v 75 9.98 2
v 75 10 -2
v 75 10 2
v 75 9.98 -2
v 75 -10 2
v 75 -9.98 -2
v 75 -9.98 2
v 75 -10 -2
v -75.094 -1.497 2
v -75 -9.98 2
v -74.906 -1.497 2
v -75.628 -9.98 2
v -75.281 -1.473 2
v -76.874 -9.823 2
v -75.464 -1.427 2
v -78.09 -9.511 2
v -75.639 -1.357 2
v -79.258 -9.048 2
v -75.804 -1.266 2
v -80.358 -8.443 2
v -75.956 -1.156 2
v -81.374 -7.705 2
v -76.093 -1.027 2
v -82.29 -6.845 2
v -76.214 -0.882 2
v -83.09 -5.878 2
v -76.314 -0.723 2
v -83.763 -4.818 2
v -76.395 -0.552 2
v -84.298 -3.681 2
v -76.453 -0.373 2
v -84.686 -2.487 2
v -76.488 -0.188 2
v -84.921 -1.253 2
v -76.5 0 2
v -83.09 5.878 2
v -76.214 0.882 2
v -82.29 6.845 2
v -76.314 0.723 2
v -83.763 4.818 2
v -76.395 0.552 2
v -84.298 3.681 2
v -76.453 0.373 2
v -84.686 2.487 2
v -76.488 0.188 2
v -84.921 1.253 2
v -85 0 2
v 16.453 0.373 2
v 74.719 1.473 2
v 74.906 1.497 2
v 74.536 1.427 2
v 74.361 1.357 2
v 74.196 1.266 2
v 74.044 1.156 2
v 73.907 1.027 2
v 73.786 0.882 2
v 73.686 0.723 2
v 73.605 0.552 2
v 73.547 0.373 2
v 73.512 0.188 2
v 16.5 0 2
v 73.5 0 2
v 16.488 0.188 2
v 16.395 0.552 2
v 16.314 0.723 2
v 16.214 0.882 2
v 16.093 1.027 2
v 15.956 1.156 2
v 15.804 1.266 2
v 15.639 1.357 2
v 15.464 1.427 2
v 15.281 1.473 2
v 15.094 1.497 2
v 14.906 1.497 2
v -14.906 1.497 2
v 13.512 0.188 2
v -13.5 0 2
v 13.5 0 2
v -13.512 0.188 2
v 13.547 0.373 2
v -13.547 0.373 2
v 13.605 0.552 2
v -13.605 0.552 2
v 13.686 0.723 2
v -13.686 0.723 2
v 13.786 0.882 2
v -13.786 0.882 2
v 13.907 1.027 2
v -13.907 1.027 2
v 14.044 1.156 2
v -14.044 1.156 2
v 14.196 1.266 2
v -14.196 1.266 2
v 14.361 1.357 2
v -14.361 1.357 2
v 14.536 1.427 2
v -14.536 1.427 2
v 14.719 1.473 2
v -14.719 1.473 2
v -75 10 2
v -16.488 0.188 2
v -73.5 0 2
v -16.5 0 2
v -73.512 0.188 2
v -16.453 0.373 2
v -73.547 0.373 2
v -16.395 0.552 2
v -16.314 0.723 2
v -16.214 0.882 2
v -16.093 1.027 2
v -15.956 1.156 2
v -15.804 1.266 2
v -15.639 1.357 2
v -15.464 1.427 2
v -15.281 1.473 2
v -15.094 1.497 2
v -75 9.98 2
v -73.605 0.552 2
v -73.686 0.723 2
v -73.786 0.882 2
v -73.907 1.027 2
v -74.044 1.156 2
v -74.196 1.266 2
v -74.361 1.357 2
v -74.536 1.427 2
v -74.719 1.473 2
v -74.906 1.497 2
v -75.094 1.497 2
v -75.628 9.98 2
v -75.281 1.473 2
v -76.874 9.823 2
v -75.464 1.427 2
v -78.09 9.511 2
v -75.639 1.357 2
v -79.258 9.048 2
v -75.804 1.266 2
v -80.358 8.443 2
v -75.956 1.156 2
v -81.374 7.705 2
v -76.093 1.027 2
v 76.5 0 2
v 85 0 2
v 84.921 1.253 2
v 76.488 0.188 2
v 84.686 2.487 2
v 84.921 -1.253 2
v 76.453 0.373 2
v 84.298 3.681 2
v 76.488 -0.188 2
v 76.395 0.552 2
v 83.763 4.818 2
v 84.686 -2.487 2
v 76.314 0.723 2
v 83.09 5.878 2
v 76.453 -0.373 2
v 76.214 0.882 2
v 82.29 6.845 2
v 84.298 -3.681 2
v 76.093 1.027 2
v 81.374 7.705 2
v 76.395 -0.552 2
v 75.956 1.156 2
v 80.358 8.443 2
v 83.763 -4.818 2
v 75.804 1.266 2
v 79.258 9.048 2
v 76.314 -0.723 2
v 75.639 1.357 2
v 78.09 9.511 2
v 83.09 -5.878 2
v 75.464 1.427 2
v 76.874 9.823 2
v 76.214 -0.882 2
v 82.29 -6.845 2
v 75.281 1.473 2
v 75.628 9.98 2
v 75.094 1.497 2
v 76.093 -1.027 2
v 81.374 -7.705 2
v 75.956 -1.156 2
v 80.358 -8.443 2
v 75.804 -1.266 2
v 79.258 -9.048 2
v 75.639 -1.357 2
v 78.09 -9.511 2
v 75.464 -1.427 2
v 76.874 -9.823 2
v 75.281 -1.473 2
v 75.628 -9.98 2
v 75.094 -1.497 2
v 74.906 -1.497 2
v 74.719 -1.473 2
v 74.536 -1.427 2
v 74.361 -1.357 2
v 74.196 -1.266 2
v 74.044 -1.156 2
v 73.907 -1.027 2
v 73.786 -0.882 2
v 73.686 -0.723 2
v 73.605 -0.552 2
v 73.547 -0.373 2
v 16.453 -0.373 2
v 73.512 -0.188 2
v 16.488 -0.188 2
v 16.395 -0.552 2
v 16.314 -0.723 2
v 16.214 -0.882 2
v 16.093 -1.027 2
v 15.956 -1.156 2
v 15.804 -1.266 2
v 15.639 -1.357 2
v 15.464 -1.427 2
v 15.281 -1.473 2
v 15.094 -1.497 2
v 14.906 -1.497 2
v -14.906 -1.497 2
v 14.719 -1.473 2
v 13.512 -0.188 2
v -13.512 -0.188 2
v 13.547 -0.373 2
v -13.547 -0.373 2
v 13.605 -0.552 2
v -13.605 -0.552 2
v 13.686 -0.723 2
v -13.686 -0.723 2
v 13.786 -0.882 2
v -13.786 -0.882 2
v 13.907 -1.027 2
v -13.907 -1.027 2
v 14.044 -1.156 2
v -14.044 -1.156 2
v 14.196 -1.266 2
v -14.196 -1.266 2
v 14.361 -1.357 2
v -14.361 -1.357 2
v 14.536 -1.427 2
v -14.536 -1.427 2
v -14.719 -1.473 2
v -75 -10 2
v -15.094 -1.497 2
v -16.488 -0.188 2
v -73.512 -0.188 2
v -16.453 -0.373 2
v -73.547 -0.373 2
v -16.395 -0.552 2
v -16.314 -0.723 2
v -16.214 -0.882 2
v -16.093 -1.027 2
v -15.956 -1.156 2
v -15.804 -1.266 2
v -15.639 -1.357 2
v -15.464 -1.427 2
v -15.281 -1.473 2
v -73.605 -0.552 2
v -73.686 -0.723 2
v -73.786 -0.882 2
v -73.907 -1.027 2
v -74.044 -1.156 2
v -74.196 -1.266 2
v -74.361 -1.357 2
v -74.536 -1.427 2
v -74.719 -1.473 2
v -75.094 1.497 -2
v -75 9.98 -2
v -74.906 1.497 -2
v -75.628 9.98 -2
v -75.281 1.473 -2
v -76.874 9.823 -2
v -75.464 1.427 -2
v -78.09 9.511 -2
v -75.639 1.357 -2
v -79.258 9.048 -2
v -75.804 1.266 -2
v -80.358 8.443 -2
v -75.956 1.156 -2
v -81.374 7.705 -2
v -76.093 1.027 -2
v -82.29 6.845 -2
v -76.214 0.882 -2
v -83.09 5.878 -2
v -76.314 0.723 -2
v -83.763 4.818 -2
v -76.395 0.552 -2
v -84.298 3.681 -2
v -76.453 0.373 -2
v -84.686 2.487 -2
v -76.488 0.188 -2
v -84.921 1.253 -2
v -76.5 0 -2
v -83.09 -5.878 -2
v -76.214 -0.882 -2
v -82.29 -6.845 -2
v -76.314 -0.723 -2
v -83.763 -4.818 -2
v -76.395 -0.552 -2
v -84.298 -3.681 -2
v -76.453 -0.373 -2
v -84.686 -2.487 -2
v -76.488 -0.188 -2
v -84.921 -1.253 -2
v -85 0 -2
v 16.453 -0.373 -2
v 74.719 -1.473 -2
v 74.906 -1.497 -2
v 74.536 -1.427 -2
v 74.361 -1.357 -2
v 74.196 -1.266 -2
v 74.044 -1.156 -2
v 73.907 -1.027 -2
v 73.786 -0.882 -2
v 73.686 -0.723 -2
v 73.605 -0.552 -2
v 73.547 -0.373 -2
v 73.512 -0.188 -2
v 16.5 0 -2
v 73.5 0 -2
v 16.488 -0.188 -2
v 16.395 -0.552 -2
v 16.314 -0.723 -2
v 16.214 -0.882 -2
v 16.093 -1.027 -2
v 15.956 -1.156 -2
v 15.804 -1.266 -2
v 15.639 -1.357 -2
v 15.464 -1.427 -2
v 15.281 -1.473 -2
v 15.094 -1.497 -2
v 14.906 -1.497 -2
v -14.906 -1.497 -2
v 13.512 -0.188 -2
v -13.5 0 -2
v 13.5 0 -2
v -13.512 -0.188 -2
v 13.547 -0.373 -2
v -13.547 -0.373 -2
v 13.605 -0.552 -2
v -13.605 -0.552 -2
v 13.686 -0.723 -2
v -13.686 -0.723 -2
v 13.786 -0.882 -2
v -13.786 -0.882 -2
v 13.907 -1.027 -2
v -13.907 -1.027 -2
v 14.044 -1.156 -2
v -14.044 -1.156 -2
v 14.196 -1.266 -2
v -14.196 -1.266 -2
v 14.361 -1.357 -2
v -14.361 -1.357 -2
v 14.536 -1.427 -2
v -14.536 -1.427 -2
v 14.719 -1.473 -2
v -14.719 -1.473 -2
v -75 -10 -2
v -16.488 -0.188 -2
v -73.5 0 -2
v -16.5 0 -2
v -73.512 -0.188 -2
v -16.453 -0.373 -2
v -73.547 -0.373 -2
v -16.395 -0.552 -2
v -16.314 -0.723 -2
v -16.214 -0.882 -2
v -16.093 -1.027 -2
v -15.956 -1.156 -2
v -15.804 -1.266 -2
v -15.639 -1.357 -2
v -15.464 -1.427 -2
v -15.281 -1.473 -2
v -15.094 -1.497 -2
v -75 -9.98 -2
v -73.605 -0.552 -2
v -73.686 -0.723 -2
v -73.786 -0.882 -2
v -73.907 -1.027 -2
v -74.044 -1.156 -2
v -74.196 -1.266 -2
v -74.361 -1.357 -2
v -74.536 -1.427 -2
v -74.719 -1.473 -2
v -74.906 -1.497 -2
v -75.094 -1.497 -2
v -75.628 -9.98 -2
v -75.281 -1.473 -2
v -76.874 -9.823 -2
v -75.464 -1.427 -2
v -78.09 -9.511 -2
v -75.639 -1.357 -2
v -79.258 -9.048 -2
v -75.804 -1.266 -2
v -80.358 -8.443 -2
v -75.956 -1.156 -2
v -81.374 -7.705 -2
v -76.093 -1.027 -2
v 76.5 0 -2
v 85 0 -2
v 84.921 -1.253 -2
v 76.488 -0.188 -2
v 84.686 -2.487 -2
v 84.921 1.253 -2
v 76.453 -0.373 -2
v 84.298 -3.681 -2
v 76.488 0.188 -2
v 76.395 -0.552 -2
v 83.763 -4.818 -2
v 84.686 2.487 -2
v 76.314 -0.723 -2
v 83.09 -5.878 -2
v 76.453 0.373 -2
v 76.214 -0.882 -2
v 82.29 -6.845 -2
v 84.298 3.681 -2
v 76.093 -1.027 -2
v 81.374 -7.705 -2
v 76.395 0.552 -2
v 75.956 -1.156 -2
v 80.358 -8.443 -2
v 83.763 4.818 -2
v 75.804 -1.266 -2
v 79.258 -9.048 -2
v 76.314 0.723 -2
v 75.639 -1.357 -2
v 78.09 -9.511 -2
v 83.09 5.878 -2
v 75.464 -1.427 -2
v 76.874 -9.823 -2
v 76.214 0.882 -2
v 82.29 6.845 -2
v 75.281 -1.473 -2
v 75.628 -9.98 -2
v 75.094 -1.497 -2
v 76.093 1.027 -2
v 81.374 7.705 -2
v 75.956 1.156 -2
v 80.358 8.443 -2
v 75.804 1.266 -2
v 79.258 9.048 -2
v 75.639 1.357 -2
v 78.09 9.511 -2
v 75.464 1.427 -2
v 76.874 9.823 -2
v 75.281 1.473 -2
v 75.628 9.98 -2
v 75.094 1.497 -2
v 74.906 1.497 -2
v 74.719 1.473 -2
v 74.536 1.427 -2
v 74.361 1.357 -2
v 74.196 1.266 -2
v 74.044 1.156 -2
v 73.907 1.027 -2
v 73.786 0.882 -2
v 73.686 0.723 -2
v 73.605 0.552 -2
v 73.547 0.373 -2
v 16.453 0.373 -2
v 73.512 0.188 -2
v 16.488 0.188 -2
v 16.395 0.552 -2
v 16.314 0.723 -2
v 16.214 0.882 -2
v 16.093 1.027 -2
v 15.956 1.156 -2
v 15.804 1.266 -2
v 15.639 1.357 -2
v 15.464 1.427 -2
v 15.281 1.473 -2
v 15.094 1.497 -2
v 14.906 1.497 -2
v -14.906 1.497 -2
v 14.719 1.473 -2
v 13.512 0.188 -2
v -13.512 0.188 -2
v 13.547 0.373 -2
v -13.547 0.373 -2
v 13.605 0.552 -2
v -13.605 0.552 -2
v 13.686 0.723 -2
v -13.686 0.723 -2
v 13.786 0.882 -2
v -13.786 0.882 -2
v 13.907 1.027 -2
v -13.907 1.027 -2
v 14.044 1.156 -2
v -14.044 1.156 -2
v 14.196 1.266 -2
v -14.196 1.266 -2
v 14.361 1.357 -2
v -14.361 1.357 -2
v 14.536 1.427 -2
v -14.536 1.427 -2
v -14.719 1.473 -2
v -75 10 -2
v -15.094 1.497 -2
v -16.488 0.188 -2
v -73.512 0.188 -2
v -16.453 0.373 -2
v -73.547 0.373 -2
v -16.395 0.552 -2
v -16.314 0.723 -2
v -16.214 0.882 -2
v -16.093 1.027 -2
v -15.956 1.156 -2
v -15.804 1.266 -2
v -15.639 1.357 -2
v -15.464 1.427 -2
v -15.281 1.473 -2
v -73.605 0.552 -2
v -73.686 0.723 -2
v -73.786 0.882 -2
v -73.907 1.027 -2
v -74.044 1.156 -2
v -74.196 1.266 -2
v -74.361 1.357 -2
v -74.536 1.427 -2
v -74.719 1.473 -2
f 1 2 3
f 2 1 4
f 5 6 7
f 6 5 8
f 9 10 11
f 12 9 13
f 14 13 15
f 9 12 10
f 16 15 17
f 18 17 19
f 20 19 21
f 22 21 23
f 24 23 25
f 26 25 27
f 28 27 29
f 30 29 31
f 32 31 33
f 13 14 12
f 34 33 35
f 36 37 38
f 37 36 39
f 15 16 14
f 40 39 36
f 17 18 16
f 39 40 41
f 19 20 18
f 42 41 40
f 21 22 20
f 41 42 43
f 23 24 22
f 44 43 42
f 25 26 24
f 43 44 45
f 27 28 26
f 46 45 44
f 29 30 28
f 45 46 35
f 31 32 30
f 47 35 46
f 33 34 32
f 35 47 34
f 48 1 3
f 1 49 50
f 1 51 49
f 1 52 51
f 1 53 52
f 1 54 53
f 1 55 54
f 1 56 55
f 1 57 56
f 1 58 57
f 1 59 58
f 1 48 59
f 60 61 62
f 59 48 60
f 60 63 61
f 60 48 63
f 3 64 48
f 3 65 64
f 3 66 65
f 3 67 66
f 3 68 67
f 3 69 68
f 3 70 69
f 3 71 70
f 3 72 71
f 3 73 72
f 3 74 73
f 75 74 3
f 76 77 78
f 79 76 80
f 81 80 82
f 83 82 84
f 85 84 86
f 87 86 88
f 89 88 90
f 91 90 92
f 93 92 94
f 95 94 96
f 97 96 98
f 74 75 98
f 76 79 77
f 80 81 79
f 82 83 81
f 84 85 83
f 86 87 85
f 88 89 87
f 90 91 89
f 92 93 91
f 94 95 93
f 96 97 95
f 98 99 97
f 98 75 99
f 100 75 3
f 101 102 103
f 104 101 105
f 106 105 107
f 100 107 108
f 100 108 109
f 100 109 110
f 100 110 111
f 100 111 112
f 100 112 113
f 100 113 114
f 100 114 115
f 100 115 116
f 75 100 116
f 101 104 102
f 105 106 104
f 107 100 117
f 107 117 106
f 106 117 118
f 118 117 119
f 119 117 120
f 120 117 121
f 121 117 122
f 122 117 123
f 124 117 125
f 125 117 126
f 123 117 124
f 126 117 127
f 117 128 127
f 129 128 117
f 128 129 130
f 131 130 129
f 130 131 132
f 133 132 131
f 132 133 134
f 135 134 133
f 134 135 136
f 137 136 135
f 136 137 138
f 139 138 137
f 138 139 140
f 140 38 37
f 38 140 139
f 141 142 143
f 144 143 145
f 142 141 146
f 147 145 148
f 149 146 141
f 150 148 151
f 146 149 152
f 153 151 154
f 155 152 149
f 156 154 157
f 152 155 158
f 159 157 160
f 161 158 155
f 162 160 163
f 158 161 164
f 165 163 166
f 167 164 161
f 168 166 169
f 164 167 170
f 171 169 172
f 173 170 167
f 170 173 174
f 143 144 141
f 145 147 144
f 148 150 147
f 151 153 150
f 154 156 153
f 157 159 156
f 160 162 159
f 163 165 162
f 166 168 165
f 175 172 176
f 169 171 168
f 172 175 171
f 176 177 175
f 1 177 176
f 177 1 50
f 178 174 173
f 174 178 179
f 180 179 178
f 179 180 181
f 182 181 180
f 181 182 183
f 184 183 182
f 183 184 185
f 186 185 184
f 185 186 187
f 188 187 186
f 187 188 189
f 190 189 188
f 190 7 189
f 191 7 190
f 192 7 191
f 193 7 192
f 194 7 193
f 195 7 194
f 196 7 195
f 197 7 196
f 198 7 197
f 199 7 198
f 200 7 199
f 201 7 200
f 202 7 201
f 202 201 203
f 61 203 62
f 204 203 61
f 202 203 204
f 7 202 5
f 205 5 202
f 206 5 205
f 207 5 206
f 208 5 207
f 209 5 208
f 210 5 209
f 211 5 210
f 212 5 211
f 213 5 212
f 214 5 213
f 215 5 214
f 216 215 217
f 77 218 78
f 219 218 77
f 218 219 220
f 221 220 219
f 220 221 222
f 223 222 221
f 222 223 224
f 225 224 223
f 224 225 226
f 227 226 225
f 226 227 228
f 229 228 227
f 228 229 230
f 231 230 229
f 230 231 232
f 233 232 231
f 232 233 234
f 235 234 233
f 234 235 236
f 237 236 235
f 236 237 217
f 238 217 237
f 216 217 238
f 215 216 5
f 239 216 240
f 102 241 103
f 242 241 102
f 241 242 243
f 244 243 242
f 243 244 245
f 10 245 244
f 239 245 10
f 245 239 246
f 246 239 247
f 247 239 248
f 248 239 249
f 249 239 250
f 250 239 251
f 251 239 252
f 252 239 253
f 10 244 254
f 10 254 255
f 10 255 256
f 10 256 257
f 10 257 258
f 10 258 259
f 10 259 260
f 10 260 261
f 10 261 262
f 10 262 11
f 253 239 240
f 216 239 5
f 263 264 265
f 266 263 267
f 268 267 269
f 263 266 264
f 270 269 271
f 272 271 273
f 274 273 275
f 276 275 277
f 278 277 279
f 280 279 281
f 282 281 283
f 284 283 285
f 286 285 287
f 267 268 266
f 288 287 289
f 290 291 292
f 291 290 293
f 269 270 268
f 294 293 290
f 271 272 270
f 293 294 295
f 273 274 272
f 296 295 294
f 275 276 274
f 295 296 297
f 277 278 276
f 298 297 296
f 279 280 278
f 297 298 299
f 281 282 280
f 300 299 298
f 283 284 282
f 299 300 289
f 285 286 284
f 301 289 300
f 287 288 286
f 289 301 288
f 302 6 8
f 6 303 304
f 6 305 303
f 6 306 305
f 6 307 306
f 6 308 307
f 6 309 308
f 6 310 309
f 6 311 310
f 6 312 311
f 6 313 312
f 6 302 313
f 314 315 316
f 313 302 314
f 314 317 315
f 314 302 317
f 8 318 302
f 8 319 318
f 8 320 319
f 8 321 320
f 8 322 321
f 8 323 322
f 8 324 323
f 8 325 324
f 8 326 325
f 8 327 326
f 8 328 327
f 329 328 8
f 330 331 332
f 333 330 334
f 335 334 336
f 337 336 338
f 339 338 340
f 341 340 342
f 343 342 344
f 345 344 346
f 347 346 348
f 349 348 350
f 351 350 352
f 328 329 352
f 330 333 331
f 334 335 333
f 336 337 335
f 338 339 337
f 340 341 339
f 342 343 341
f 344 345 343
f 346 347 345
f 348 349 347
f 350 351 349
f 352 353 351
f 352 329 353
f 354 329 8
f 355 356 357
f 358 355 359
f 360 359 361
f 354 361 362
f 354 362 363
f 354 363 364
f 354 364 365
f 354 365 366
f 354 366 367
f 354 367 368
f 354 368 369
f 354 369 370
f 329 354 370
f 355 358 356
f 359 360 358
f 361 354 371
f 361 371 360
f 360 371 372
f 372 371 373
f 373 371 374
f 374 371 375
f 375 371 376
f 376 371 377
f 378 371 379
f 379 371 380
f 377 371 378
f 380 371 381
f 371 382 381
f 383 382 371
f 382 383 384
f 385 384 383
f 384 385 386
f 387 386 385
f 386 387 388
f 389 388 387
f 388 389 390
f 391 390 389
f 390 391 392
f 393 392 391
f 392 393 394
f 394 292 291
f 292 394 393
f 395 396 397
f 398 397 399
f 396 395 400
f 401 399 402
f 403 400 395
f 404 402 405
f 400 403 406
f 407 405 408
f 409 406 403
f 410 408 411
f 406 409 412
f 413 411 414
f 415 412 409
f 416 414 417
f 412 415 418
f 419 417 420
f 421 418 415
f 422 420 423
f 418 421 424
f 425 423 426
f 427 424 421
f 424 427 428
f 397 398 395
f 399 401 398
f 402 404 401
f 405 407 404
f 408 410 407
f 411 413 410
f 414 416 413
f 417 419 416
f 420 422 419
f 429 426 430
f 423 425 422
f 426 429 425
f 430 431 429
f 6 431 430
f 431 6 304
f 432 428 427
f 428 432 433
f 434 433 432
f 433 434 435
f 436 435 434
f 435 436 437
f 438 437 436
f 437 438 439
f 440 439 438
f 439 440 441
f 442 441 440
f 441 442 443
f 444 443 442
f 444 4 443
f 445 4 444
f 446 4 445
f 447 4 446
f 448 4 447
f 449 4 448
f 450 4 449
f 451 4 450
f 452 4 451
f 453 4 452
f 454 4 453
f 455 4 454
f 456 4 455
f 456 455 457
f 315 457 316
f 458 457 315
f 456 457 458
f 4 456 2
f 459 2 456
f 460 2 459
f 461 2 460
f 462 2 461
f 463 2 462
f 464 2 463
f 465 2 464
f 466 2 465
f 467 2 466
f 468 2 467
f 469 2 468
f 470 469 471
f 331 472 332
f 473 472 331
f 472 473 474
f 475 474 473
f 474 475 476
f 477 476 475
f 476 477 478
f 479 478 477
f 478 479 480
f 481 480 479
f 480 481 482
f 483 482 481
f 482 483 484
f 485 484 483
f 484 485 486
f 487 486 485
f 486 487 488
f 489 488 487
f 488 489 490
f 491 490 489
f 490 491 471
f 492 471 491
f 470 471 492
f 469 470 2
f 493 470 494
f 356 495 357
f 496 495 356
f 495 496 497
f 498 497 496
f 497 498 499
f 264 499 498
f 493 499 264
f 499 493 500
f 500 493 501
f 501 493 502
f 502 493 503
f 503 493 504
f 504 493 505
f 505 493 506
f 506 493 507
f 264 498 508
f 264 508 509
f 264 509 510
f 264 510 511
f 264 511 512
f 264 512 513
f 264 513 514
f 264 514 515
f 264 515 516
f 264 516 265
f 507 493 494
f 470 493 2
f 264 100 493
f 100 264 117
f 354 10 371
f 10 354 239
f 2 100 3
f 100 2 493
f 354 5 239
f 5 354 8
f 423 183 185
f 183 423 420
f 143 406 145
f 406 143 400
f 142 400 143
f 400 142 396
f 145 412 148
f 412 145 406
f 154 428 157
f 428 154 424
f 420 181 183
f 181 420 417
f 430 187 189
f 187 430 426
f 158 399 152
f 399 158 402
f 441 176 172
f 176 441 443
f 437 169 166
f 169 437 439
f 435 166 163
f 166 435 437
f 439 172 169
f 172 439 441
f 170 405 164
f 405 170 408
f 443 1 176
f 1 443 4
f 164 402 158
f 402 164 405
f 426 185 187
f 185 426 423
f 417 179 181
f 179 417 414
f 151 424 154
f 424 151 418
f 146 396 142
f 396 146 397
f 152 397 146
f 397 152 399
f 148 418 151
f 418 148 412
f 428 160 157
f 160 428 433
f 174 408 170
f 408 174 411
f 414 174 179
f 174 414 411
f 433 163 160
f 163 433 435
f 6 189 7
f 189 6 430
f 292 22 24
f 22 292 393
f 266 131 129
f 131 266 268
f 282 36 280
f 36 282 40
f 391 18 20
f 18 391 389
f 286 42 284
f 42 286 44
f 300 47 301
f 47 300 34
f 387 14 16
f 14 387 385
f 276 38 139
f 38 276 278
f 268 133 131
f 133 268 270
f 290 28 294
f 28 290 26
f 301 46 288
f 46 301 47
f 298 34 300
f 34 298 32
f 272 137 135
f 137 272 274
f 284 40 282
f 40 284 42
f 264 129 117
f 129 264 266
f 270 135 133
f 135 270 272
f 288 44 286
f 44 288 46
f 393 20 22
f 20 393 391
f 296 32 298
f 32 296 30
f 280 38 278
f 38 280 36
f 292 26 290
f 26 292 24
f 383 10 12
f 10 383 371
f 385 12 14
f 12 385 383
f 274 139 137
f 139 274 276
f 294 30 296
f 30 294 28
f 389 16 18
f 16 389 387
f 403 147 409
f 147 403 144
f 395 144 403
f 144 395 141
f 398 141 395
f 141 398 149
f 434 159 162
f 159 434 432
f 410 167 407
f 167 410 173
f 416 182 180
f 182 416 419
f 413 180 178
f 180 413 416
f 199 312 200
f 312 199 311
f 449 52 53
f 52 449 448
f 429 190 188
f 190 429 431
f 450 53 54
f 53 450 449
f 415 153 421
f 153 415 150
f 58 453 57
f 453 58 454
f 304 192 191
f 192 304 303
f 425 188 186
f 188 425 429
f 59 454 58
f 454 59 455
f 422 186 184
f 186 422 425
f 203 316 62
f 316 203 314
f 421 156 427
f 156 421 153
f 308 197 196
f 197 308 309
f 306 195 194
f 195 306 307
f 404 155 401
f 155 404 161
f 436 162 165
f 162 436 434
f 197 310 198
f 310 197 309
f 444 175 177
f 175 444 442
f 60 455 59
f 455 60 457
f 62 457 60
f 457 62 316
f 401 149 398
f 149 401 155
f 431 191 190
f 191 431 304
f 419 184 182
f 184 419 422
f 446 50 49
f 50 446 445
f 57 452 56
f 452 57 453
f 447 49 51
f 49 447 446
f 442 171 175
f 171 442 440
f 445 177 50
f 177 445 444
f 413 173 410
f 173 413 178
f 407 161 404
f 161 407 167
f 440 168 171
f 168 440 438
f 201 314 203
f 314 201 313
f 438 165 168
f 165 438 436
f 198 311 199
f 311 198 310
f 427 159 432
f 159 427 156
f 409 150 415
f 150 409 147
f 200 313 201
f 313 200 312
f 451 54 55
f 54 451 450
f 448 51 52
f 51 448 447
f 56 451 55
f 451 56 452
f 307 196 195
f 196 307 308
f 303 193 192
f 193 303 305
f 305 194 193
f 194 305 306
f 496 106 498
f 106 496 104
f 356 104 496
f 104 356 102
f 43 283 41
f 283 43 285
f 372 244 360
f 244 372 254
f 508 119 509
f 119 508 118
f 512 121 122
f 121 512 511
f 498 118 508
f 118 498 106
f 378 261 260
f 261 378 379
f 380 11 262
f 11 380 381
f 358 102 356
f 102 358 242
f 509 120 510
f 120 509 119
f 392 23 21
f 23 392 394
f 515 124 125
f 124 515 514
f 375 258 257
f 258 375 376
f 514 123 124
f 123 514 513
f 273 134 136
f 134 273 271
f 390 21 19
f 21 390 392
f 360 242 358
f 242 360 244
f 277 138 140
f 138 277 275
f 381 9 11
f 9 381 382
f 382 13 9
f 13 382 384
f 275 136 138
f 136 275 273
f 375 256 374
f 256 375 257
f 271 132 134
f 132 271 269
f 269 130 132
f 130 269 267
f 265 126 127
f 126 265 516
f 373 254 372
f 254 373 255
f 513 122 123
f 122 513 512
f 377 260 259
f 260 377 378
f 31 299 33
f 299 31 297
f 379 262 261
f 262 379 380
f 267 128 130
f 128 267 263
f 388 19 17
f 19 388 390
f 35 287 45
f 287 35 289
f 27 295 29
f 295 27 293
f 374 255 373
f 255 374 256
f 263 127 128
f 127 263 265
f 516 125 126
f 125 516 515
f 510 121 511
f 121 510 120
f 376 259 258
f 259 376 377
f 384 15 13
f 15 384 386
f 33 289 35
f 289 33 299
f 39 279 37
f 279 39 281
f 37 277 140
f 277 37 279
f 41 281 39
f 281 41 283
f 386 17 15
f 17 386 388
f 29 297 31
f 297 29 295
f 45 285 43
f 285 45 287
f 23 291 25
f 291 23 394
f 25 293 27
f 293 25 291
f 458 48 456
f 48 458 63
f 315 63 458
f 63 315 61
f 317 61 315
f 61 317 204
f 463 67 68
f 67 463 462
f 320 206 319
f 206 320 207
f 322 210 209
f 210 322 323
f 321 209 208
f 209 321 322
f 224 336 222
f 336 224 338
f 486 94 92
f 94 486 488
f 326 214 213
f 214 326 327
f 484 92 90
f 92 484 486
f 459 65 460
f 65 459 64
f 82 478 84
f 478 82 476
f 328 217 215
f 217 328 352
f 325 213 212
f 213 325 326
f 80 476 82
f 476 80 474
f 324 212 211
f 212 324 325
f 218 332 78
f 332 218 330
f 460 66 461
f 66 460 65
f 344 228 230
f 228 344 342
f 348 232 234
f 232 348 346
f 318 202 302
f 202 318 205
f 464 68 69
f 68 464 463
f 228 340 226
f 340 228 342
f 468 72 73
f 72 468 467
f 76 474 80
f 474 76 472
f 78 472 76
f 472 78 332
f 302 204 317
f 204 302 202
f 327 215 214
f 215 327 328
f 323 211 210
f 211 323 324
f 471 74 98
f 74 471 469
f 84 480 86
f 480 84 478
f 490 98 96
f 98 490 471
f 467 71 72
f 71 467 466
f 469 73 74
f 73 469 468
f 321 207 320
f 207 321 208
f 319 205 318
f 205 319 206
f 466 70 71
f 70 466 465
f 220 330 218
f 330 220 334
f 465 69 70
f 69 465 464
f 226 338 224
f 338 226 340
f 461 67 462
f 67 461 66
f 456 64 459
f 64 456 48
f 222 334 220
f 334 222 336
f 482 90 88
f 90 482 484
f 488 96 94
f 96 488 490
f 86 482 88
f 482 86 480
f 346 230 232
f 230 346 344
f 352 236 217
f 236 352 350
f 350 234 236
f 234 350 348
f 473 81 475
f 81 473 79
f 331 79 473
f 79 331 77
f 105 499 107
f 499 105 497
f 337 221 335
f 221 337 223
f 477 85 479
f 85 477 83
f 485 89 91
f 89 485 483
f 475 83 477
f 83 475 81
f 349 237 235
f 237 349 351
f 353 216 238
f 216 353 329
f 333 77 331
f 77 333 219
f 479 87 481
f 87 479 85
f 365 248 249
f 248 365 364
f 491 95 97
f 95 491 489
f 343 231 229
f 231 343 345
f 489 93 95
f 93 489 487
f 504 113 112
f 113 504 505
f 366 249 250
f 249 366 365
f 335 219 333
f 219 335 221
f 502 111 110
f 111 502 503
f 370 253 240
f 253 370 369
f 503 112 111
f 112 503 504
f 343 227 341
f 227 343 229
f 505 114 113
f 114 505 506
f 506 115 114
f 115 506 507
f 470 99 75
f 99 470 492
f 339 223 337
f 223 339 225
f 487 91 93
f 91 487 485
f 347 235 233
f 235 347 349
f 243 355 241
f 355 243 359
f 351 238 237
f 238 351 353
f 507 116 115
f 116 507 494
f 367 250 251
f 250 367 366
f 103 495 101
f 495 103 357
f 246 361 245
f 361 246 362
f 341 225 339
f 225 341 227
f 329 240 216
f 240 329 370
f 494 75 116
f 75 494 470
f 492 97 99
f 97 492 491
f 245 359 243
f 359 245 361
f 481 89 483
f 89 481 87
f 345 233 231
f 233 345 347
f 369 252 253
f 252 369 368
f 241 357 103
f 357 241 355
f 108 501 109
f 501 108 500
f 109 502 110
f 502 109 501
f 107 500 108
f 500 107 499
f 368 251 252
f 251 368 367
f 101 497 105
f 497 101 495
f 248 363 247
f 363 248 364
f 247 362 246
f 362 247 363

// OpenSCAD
//Author: Piotr Paterek, Kraków 05-08.2016
$fn=50;
module cal()
{
cube([150,20,4], center=true);
translate([75,0,0])
                    {
                        cylinder(r=10, h=4, center=true);
                    }
translate([-75,0,0])
                    {
                        cylinder(r=10, h=4, center=true);
                    }
}
                
difference()
{
    difference()
    {
        difference()
        {
            difference()
            {
                difference()
                {
                    cal();
                    translate([75,0,0])
                    {
                        cylinder(r=1.5, h=4, center=true);
                    }
                    translate([-75,0,0])
                    {
                        cylinder(r=1.5, h=4, center=true);
                    }
                }
            }
            translate([15,0,0])
             {
                    cylinder(r=1.5,h=4,center=true);
             }
        }
        
                    
    }
     translate([-15,0,0])
             {
                    cylinder(r=1.5,h=4,center=true);
             }
         }
